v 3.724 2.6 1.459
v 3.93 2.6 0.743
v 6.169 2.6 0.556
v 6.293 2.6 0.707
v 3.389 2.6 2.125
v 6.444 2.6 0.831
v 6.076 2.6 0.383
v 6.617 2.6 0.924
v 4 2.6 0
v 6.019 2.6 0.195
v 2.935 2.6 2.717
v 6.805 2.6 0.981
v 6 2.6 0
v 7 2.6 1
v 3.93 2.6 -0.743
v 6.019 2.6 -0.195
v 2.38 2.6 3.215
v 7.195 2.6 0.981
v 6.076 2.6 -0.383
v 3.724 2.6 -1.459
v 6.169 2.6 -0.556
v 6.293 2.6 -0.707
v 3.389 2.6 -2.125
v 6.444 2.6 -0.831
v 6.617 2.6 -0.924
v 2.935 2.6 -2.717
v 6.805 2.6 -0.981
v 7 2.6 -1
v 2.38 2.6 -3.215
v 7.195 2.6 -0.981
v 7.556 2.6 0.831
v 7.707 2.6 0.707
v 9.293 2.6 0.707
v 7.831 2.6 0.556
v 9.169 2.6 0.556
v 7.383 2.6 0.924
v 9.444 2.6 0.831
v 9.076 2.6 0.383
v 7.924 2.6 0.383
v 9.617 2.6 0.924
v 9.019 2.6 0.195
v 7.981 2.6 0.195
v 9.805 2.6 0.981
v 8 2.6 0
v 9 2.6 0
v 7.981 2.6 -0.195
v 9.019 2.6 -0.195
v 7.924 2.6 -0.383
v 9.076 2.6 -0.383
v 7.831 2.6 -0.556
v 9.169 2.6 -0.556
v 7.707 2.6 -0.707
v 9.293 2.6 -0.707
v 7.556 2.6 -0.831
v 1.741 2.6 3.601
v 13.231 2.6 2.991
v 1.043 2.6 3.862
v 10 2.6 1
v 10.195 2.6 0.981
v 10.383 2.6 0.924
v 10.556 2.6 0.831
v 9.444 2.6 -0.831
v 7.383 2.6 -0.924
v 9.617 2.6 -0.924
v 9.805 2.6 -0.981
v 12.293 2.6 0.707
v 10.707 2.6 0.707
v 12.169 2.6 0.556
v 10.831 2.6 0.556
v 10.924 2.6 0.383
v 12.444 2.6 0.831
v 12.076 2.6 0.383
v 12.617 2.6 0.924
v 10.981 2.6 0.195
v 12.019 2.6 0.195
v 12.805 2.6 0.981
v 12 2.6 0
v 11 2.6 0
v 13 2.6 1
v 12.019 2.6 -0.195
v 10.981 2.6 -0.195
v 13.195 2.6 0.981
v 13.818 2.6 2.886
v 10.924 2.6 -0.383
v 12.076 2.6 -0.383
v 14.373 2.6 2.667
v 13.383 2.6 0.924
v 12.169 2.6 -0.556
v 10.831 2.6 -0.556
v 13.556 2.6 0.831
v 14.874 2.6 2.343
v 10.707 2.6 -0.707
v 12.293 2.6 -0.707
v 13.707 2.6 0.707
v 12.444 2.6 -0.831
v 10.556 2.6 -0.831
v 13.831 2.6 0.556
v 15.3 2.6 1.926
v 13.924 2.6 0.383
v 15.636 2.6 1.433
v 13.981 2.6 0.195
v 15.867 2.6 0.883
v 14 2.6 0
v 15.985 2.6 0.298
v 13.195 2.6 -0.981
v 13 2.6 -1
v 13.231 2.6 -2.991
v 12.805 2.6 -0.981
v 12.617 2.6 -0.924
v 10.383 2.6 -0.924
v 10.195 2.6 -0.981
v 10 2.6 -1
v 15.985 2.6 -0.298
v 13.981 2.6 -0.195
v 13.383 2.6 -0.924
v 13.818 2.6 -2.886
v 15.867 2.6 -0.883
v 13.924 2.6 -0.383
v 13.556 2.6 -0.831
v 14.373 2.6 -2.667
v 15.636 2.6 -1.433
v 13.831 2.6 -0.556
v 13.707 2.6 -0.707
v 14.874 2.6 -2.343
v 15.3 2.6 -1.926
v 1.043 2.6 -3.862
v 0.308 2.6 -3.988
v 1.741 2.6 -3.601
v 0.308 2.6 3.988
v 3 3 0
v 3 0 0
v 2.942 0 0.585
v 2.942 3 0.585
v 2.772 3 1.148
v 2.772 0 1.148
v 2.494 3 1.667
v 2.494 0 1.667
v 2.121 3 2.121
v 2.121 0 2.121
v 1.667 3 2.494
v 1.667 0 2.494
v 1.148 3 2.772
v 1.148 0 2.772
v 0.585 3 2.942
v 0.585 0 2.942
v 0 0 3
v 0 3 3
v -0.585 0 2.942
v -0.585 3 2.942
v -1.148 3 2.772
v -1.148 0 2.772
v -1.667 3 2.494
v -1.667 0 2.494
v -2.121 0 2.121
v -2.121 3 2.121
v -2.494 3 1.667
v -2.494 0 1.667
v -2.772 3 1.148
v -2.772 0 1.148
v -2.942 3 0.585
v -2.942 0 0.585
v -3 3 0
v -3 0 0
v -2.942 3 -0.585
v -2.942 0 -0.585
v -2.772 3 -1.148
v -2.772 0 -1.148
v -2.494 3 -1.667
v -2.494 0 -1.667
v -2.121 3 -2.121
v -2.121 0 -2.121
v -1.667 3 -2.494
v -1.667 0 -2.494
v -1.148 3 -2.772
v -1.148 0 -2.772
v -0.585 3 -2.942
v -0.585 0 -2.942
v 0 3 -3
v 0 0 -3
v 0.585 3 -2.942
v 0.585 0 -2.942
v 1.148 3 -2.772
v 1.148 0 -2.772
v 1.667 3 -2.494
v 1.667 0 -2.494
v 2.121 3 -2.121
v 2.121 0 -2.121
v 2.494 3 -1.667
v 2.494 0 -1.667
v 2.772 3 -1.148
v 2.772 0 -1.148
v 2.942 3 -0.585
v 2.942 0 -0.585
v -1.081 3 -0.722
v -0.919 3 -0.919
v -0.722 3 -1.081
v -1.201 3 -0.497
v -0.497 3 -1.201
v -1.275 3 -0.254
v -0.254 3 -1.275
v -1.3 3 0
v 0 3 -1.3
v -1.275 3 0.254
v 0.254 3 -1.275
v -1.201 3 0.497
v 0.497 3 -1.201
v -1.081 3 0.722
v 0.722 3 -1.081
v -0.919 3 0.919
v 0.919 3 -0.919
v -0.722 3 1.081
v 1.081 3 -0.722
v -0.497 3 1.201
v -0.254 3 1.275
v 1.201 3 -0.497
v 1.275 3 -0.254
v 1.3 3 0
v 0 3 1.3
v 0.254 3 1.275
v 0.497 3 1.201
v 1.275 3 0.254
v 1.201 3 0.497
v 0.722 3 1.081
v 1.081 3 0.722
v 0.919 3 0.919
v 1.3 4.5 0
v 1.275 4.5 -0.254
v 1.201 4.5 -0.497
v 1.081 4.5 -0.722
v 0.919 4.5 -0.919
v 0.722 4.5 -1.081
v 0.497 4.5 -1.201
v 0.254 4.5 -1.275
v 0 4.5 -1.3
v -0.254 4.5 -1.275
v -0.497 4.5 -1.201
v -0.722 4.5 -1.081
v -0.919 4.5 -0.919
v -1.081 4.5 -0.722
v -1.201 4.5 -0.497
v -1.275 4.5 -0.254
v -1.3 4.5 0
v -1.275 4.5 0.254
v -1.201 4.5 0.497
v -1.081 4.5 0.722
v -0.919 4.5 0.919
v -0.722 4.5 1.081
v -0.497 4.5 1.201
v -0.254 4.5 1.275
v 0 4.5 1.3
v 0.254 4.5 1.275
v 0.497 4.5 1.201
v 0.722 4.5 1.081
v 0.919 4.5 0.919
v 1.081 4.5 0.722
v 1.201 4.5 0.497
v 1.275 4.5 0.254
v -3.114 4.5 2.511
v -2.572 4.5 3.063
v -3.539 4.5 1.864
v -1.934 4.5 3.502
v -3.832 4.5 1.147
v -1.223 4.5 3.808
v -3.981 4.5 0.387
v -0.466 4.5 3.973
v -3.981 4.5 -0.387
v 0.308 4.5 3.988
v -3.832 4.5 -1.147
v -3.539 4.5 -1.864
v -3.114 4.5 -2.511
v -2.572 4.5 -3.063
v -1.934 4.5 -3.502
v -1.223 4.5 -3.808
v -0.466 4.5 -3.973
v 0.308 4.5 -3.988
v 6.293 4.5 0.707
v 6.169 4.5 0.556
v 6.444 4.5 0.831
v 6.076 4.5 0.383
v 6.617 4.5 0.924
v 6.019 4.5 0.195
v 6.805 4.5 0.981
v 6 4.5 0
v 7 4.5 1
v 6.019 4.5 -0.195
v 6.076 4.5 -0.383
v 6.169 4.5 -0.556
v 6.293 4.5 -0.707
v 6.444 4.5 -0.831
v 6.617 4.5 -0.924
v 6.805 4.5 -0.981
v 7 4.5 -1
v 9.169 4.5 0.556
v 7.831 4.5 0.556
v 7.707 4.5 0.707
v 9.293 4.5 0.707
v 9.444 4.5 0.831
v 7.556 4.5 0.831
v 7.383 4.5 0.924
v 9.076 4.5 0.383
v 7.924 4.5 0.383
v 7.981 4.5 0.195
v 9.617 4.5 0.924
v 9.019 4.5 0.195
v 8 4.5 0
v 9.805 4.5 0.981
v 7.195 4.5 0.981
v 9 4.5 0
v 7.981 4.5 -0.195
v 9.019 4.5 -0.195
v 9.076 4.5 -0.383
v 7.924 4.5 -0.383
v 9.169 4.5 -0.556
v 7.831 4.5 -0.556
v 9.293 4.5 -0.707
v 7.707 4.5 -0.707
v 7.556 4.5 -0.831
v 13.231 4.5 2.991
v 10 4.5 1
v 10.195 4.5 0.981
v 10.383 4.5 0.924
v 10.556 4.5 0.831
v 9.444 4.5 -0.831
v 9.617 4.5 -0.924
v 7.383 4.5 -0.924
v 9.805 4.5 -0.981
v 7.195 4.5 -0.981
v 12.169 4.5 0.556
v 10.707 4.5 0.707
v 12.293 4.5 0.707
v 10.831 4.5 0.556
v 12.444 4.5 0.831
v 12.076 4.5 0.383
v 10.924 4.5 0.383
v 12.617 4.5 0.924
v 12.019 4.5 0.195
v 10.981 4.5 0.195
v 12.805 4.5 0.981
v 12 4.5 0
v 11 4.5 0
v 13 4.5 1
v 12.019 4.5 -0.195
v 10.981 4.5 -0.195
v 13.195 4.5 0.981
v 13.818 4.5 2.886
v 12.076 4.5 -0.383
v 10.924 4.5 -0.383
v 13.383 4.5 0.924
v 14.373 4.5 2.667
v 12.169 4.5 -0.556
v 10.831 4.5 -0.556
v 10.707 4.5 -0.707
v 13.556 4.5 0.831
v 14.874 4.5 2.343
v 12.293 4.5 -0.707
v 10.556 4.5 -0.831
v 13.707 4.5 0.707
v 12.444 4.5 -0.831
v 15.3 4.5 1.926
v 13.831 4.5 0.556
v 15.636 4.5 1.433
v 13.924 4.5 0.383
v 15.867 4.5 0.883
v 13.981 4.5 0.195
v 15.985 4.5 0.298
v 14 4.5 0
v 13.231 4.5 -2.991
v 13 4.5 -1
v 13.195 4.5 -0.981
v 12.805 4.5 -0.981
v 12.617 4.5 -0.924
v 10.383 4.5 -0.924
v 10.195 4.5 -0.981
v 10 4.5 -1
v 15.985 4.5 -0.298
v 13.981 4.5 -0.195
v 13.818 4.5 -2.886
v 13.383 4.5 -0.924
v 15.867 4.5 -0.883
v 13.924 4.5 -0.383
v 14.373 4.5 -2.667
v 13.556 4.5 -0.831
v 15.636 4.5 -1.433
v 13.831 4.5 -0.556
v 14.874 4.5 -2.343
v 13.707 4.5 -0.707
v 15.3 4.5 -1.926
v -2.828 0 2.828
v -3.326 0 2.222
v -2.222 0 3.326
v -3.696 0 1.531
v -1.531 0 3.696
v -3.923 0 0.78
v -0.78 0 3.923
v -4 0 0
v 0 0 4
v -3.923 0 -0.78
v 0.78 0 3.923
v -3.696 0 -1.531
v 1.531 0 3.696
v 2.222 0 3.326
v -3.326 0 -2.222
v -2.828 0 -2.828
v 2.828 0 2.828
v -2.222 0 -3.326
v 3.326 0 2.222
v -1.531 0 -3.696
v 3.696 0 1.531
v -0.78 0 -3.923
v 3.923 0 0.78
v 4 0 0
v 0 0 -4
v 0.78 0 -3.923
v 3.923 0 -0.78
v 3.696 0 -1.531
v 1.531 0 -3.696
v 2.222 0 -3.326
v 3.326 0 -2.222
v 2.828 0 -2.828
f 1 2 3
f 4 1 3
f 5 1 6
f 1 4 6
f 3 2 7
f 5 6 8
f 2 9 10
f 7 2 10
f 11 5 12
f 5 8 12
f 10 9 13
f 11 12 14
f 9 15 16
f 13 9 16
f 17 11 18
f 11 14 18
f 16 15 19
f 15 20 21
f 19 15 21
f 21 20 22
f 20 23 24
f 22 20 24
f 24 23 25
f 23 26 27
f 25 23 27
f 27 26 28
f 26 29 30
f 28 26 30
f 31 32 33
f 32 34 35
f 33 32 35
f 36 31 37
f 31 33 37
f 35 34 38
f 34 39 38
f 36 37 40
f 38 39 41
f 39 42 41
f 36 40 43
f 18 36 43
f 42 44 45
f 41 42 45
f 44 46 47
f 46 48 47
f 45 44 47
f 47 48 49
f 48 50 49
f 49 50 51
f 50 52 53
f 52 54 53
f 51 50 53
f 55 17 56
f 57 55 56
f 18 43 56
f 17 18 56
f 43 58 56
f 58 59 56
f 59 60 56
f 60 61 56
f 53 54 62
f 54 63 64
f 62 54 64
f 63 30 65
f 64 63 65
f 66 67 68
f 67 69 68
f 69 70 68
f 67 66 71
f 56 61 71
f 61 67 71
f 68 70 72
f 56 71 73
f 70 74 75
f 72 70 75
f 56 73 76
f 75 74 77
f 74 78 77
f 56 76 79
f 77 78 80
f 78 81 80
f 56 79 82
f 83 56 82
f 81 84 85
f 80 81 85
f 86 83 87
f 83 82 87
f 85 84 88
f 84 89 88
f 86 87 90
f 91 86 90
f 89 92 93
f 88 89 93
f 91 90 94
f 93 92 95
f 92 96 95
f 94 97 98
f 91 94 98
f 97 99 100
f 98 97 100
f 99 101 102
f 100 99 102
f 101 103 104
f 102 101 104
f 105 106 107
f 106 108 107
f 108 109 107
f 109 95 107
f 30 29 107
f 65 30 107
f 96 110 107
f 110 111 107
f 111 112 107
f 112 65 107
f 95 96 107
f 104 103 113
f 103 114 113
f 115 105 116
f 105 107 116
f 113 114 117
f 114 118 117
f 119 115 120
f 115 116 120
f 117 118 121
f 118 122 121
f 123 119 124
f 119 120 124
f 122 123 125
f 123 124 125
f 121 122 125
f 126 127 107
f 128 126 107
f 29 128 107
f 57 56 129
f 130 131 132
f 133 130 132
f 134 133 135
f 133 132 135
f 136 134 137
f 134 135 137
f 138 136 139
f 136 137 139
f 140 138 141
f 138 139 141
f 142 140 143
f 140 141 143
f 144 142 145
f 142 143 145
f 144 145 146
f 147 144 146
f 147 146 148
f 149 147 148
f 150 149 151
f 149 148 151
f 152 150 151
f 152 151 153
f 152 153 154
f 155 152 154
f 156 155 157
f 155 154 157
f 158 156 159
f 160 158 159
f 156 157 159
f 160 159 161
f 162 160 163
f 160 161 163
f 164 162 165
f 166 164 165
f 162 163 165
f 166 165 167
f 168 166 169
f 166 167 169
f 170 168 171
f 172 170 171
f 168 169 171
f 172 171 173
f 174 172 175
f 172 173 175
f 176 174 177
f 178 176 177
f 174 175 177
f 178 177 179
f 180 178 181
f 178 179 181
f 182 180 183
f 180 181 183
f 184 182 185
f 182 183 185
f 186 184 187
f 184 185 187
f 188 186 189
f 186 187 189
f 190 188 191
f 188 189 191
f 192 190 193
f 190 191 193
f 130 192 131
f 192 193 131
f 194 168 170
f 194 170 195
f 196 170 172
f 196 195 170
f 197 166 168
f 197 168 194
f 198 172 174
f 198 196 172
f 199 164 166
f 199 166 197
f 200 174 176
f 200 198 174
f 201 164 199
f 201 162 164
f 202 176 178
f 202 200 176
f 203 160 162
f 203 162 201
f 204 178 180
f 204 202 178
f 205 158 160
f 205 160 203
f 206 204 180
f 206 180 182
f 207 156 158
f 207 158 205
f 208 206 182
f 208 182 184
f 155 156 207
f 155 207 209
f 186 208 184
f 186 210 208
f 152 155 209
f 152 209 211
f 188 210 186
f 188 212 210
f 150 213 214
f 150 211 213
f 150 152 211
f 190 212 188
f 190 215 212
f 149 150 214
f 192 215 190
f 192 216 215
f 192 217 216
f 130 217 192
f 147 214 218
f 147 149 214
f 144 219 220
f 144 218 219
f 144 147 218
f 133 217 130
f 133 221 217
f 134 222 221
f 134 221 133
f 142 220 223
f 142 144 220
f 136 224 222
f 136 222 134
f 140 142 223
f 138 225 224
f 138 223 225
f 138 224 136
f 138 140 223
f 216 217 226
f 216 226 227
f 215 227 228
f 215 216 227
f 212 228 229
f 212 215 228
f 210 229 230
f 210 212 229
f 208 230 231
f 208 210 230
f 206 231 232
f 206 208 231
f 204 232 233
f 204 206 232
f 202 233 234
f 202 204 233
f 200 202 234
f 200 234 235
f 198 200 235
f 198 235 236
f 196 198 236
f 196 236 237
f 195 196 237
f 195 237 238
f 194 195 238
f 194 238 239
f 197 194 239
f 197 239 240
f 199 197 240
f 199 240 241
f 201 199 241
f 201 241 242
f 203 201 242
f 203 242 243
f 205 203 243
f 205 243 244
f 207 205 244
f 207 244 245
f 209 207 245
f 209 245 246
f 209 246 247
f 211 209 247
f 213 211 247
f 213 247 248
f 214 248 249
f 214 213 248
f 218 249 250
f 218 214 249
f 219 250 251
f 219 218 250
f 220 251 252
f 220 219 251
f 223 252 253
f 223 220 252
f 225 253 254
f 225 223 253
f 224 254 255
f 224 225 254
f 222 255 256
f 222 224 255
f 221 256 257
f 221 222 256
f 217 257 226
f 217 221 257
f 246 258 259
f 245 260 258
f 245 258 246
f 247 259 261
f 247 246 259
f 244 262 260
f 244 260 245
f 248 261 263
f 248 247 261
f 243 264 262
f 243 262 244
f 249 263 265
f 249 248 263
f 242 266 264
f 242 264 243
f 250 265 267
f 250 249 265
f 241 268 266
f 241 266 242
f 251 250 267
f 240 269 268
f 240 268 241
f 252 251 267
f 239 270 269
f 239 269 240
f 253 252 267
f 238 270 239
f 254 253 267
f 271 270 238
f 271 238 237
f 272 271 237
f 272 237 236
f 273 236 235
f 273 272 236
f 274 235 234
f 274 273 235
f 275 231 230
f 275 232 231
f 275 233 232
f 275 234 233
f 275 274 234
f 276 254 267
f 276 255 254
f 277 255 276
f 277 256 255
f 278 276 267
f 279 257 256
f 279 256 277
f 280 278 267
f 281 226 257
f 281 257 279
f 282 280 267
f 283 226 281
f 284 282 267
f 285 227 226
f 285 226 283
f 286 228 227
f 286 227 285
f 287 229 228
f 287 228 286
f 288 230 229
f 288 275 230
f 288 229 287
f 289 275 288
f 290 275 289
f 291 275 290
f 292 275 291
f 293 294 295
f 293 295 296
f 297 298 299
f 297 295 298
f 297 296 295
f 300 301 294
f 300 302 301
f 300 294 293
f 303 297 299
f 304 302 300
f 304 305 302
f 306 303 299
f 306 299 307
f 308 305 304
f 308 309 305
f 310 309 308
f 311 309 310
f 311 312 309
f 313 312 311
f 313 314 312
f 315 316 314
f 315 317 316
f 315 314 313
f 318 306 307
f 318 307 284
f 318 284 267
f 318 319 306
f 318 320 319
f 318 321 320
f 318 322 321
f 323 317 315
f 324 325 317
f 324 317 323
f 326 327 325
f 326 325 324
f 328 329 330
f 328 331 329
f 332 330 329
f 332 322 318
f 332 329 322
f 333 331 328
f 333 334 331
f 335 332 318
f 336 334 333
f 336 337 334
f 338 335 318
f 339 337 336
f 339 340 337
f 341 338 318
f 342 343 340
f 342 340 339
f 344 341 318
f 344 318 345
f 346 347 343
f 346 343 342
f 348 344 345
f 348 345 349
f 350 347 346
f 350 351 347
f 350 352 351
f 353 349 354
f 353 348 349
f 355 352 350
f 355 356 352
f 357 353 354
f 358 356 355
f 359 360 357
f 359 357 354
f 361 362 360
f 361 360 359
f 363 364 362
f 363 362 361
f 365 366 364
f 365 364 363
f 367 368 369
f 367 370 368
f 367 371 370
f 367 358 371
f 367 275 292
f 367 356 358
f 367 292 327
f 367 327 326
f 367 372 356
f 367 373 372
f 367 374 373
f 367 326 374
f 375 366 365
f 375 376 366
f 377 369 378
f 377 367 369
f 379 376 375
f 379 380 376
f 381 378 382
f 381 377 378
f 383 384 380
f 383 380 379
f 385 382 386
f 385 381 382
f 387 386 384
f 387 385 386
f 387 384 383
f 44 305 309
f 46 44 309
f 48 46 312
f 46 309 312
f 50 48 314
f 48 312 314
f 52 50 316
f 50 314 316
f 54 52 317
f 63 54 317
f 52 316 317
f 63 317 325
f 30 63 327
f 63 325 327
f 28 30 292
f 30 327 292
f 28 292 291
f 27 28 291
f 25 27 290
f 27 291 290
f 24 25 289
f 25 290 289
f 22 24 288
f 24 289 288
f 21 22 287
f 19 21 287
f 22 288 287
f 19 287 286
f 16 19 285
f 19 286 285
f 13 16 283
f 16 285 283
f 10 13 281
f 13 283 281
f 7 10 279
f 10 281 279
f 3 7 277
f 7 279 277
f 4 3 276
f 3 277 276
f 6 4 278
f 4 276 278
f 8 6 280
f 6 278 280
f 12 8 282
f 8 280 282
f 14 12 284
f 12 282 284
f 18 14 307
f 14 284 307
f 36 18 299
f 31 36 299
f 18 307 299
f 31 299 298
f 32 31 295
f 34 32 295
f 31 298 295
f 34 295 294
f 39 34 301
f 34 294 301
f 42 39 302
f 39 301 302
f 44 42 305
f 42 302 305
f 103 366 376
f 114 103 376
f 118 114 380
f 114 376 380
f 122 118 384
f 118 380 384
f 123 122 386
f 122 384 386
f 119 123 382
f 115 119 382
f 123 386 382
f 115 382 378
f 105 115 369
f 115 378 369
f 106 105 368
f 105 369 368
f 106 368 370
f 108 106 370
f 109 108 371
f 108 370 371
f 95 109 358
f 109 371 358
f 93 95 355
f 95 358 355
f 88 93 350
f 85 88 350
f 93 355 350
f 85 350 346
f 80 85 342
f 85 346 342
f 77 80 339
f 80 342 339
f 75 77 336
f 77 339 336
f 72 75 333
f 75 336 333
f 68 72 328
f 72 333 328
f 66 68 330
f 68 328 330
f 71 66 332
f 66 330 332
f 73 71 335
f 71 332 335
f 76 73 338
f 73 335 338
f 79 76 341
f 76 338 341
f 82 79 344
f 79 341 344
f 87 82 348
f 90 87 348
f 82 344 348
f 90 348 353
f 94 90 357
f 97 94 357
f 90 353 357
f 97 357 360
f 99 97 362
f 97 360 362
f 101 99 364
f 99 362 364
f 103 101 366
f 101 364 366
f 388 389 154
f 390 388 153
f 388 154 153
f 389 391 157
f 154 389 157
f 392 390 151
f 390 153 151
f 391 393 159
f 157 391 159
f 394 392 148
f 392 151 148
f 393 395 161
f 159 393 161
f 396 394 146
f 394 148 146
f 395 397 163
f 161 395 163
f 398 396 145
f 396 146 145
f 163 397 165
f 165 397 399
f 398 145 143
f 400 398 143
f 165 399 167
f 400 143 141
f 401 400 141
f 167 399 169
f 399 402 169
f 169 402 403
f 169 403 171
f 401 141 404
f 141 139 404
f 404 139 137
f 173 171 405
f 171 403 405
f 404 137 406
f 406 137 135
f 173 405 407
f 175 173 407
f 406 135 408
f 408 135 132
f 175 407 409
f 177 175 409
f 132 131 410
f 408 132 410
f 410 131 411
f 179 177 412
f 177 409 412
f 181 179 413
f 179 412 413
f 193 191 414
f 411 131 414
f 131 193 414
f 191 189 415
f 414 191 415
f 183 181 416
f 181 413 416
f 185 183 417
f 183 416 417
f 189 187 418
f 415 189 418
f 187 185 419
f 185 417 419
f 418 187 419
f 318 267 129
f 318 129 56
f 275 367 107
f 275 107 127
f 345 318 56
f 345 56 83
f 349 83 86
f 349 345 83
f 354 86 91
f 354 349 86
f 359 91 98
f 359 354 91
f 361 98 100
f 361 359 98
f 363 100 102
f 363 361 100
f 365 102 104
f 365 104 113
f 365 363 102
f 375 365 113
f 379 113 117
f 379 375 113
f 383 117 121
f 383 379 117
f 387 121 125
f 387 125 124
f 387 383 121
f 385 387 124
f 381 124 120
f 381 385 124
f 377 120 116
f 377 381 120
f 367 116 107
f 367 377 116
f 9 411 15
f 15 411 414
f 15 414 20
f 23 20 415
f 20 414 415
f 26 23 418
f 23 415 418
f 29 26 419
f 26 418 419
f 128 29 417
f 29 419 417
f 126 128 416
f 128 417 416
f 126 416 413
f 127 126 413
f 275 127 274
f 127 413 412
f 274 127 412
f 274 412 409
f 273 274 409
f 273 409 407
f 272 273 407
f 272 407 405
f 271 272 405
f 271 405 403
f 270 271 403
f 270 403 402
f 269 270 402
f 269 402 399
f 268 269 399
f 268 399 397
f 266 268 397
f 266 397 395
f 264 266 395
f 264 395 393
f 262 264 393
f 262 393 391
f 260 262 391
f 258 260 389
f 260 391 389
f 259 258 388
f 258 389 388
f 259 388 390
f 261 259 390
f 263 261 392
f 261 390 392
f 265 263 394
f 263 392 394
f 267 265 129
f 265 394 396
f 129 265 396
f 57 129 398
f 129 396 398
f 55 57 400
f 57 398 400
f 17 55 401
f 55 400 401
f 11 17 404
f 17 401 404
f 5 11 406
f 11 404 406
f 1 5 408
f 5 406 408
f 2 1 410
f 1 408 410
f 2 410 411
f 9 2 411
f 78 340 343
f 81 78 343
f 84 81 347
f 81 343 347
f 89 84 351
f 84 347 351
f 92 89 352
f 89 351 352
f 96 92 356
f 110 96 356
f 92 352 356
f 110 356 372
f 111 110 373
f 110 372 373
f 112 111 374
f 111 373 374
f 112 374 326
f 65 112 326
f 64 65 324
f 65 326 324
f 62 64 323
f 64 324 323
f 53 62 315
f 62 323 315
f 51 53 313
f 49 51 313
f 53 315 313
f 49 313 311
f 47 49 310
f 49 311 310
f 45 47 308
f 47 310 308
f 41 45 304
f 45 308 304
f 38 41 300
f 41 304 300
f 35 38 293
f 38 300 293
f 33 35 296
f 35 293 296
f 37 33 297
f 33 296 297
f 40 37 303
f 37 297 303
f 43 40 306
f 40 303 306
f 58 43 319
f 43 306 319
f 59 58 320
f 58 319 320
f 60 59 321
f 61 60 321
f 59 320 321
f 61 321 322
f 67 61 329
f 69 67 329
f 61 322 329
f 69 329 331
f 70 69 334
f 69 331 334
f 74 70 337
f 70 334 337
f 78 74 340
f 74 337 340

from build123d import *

# Parameters (mm, degrees)
SKETCH_1_R          = 4
SKETCH_1_R_2        = 1.3
EXTRUDE_1_DEPTH     = 4.5
SKETCH_2_R          = 1
EXTRUDE_2_DEPTH     = 1.9
SKETCH_3_R          = 3
CUT_EXTRUDE_1_DEPTH = 3


with BuildPart() as part:
    # 草图1 → 凸台-拉伸1 (new body)
    with BuildSketch(Plane(origin=(0, 0, 0), x_dir=(1, 0, 0), z_dir=(0, 1, 0))):
        Circle(SKETCH_1_R)
        Circle(SKETCH_1_R_2, mode=Mode.SUBTRACT)
    extrude(amount=EXTRUDE_1_DEPTH)

    # 草图2 → 凸台-拉伸2 (add)
    with BuildSketch(Plane(origin=(0, 4.5, 0), x_dir=(1, 0, 0), z_dir=(0, 1, 0))):
        with BuildLine():
            Line((13.230769231, 2.991111092), (0.307692308, 3.988148122))
            ThreePointArc((0.307692308, 3.988148122), (4, 0), (0.307692308, -3.988148122))
            Line((0.307692308, -3.988148122), (13.230769231, -2.991111092))
            ThreePointArc((13.230769231, -2.991111092), (16, 0), (13.230769231, 2.991111092))
        make_face()
        with Locations((10, 0)):
            Circle(SKETCH_2_R, mode=Mode.SUBTRACT)
        with Locations((7, 0)):
            Circle(SKETCH_2_R, mode=Mode.SUBTRACT)
        with Locations((13, 0)):
            Circle(SKETCH_2_R, mode=Mode.SUBTRACT)
    extrude(amount=-EXTRUDE_2_DEPTH)

    # 草图3 → 切除-拉伸1 (cut)
    with BuildSketch(Plane.XZ):
        Circle(SKETCH_3_R)
    extrude(amount=-CUT_EXTRUDE_1_DEPTH, mode=Mode.SUBTRACT)


solid = part.part
